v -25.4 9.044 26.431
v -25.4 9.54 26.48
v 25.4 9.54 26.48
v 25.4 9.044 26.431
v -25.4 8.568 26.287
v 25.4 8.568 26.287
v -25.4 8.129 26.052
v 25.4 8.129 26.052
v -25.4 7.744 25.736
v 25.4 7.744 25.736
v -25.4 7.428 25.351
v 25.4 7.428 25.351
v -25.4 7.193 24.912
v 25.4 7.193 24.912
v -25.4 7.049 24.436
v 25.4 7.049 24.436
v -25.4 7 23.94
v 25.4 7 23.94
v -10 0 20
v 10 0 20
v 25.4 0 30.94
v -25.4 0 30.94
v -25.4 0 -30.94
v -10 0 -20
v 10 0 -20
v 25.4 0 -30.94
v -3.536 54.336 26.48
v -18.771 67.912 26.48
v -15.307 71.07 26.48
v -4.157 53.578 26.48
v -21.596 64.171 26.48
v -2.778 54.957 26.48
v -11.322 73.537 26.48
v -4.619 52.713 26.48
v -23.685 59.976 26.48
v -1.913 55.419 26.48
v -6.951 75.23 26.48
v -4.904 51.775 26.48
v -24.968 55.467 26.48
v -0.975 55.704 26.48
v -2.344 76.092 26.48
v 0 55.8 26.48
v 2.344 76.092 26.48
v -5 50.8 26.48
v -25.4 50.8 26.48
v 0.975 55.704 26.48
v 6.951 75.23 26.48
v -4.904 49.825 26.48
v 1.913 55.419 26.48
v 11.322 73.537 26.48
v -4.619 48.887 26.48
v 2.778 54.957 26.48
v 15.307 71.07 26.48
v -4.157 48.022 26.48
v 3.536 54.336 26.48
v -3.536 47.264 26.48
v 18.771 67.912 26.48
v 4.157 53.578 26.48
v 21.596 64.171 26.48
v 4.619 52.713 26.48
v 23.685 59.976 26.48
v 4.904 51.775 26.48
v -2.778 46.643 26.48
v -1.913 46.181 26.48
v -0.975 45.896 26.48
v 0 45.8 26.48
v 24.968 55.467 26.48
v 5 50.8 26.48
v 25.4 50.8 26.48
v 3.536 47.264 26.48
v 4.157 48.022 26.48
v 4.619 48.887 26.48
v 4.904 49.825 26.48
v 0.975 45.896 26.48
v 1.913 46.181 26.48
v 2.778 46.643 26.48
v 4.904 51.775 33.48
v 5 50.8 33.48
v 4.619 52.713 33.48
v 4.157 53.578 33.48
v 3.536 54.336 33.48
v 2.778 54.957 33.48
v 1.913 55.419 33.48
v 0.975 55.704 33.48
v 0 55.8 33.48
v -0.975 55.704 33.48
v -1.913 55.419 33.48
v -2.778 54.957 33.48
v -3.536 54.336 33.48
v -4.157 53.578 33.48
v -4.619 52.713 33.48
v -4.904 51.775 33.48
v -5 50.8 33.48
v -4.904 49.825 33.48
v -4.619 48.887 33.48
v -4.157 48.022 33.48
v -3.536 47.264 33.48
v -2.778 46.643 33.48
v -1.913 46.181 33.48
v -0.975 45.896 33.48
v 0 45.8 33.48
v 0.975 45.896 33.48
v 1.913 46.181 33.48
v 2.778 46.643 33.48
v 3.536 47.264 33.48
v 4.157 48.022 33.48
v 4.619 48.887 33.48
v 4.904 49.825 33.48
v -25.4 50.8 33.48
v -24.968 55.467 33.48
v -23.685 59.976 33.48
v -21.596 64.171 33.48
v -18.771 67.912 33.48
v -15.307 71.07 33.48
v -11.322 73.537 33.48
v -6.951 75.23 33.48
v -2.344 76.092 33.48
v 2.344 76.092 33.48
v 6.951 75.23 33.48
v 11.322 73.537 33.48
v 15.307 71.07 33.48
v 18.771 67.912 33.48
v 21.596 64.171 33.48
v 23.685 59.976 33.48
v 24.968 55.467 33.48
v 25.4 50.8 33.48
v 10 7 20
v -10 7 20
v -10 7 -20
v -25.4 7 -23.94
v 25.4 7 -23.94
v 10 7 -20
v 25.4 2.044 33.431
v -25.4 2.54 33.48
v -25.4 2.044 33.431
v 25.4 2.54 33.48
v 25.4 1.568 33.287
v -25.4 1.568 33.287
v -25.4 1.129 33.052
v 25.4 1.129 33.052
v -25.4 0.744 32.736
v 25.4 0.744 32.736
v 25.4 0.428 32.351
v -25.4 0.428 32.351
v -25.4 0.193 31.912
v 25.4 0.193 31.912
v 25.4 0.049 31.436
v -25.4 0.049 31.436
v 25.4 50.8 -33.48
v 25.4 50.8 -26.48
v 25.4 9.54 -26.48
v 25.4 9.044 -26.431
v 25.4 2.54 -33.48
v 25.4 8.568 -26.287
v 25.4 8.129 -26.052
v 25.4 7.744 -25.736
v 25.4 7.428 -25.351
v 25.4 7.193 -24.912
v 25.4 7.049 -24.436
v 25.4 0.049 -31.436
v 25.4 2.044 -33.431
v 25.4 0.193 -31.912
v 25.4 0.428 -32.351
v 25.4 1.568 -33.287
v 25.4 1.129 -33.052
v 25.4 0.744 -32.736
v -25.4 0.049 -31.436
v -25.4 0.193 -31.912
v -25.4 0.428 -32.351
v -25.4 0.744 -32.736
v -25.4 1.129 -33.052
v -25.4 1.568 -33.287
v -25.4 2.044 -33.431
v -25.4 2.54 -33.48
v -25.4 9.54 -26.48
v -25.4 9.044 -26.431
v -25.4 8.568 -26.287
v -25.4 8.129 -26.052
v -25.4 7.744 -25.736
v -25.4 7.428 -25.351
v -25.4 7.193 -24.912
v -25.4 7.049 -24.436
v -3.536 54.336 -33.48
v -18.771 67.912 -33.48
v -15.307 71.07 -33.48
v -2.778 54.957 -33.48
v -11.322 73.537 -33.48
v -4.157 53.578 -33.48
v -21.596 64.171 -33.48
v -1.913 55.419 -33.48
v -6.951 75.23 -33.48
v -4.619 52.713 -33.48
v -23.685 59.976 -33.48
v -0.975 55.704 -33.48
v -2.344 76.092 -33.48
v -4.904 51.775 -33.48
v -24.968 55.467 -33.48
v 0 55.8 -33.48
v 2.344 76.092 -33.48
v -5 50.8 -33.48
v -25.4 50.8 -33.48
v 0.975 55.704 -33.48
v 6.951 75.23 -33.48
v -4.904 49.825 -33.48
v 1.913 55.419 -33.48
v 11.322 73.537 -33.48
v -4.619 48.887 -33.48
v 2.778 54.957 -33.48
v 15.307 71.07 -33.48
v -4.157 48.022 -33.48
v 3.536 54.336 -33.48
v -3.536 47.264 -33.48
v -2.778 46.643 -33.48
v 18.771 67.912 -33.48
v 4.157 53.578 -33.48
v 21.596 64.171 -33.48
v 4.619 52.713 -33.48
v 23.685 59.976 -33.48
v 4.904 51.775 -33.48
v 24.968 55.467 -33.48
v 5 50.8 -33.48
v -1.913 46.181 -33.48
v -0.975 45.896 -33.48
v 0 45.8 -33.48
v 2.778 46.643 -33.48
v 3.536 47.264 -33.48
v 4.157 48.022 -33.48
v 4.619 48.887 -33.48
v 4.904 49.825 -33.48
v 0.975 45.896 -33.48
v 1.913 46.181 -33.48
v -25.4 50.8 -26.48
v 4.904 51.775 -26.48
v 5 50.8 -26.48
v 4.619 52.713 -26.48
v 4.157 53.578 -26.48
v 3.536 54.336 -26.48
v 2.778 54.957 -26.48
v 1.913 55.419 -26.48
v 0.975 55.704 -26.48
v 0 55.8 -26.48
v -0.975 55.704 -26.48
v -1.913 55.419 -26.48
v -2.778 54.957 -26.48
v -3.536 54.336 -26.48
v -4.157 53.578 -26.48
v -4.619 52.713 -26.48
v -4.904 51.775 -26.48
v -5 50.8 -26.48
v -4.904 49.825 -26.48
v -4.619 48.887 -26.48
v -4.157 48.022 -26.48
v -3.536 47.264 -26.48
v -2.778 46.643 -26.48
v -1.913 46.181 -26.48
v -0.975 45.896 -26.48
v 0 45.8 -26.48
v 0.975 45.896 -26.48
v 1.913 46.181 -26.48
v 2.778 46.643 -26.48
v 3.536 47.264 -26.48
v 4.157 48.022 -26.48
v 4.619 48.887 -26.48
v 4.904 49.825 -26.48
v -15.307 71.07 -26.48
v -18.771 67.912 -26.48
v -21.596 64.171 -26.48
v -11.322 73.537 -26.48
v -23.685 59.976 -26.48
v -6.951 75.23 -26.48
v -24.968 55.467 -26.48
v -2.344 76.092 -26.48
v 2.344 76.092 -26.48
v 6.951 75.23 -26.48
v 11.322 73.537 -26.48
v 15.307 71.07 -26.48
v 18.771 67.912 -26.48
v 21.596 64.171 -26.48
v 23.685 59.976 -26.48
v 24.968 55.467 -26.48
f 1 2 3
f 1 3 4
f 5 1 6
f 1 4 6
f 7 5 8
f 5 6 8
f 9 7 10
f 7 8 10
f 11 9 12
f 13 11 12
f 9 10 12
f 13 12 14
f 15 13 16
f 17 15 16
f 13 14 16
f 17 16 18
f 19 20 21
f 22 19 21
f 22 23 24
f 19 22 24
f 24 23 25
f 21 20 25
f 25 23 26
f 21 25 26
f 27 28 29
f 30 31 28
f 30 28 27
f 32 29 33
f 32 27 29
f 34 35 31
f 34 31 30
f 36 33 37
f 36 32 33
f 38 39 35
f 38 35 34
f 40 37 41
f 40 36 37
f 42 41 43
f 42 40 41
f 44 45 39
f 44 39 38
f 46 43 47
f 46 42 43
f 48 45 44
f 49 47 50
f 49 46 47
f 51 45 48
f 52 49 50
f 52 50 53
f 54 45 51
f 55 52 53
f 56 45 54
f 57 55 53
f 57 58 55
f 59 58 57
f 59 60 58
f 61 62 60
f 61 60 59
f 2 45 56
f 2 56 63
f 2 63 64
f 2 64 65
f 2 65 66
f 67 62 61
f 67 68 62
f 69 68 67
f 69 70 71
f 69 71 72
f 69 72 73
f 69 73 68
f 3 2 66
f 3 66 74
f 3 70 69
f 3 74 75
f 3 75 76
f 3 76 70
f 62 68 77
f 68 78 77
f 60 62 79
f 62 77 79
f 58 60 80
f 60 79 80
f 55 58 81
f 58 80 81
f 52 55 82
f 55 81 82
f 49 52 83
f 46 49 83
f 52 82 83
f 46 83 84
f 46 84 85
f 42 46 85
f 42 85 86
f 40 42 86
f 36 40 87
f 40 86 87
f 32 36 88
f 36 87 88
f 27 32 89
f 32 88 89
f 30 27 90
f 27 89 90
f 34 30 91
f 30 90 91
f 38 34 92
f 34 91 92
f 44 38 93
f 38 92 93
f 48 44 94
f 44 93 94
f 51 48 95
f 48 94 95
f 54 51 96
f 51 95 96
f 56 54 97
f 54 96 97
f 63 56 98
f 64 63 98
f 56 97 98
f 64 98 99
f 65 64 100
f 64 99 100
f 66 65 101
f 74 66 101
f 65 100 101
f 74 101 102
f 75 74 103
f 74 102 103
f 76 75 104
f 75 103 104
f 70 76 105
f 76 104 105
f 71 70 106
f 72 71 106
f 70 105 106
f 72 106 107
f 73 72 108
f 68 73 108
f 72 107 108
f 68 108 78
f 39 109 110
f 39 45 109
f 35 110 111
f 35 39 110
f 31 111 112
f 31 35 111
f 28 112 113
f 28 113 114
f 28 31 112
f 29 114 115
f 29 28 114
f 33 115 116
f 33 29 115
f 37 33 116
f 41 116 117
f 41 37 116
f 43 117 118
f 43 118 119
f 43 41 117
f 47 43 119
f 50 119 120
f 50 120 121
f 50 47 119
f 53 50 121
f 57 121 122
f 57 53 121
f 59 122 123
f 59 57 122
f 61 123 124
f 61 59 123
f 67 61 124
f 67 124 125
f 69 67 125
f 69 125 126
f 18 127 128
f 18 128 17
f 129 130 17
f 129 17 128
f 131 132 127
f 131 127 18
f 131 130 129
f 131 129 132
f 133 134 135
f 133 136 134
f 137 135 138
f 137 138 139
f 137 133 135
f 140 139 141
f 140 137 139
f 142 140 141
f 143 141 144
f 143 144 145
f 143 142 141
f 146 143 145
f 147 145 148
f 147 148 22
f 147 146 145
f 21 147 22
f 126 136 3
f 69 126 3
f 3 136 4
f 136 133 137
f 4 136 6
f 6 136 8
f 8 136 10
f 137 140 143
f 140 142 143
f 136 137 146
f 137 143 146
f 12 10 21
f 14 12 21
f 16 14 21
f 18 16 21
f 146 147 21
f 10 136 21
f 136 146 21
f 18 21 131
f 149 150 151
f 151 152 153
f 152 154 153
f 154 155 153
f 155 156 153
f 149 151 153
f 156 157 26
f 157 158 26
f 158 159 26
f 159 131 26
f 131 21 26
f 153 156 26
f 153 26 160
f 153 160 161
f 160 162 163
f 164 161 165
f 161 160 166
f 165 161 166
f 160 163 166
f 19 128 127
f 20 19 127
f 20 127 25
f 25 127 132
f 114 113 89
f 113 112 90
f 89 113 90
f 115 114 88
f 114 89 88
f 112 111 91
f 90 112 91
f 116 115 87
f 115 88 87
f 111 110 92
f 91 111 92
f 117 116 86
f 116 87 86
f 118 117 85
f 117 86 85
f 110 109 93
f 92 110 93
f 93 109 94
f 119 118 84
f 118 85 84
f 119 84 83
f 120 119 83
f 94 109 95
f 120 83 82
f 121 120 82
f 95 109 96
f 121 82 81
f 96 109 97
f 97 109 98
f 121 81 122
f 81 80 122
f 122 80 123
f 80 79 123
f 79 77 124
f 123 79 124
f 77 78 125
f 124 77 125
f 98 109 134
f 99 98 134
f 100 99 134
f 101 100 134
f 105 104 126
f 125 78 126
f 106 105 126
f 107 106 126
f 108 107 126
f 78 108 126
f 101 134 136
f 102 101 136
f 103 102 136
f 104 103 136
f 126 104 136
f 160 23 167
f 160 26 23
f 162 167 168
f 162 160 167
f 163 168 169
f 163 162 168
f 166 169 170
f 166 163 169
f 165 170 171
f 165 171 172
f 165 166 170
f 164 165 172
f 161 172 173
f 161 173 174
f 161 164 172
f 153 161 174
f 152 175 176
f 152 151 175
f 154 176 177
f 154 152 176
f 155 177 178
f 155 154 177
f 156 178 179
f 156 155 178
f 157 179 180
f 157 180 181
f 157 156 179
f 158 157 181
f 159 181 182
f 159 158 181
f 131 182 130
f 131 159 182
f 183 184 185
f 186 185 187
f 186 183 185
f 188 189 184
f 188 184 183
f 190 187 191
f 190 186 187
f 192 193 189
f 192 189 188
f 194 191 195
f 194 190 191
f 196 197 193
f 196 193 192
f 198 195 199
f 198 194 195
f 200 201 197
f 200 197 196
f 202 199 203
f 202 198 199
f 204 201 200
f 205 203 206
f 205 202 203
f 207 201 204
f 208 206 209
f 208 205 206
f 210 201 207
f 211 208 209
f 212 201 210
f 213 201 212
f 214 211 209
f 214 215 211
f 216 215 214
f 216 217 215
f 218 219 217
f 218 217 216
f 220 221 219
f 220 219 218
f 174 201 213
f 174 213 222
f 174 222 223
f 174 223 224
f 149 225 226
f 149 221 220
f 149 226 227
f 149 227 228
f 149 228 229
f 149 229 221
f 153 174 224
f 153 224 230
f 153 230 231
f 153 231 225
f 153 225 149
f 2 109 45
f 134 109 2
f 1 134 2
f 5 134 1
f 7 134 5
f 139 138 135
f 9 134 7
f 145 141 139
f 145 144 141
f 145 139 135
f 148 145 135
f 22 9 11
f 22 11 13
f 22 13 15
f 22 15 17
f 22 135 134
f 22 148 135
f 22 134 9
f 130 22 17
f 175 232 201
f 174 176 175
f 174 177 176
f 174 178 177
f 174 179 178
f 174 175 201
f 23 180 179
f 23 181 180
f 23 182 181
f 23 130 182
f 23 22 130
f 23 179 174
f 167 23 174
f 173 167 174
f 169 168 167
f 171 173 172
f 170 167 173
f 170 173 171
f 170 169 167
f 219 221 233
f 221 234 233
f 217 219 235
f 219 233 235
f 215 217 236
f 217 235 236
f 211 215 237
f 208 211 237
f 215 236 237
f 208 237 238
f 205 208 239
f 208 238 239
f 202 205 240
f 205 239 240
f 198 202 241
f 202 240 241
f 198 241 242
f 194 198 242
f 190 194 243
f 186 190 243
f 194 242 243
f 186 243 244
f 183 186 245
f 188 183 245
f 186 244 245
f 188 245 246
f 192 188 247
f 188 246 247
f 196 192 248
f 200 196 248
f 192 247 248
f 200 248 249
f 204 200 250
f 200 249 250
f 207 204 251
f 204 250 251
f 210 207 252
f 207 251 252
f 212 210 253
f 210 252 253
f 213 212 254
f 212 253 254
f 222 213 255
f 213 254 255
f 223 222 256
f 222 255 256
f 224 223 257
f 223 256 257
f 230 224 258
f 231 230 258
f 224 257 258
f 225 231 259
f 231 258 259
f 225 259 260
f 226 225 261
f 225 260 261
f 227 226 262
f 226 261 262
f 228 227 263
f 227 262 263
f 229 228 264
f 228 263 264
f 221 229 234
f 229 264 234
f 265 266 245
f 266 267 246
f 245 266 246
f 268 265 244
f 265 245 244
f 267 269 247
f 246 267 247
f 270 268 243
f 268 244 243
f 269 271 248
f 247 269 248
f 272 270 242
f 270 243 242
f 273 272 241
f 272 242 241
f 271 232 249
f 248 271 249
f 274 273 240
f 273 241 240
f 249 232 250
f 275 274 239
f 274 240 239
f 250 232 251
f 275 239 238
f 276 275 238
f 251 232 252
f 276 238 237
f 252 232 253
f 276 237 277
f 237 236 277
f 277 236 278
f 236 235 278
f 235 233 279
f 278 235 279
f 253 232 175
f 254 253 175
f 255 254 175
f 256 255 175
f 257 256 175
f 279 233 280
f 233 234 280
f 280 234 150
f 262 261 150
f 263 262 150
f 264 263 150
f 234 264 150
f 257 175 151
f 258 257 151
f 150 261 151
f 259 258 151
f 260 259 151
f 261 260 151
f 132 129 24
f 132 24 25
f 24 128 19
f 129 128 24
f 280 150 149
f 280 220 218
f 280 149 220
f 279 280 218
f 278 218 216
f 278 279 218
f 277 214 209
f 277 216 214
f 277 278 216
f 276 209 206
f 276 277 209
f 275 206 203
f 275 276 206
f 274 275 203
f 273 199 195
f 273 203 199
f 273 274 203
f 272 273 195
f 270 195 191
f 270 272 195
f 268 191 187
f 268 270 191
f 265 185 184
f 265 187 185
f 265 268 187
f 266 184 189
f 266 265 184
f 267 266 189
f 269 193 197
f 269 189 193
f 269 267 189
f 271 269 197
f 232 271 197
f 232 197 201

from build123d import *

# Parameters (mm, degrees)
SKETCH1_W           = 50.8
SKETCH1_H           = 66.96
BOSS_EXTRUDE1_DEPTH = 7
SKETCH2_W           = 20
SKETCH2_H           = 40
CUT_EXTRUDE1_DEPTH  = 7
SKETCH3_W           = 50.8
SKETCH3_H           = 7
BOSS_EXTRUDE2_DEPTH = 69.2
FILLET2_RADIUS      = 25.4
FILLET2_LENGTH      = 7
FILLET3_RADIUS      = 25.4
FILLET3_LENGTH      = 7
SKETCH4_R           = 5
CUT_EXTRUDE2_DEPTH  = 400
FILLET5_R           = 2.54


with BuildPart() as part:
    # Sketch1 → Boss-Extrude1 (new body)
    with BuildSketch(Plane(origin=(0, 0, 0), x_dir=(1, 0, 0), z_dir=(0, 1, 0))):
        Rectangle(SKETCH1_W, SKETCH1_H)
    extrude(amount=BOSS_EXTRUDE1_DEPTH)

    # Sketch2 → Cut-Extrude1 (cut)
    with BuildSketch(Plane(origin=(0, 7, 0), x_dir=(1, 0, 0), z_dir=(0, 1, 0))):
        Rectangle(SKETCH2_W, SKETCH2_H)
    extrude(amount=-CUT_EXTRUDE1_DEPTH, mode=Mode.SUBTRACT)

    # Sketch3 → Boss-Extrude2 (add)
    with BuildSketch(Plane(origin=(0, 7, 0), x_dir=(1, 0, 0), z_dir=(0, 1, 0))):
        with Locations((0, 29.98)):
            Rectangle(SKETCH3_W, SKETCH3_H)
        with Locations((0, -29.98)):
            Rectangle(SKETCH3_W, SKETCH3_H)
    extrude(amount=BOSS_EXTRUDE2_DEPTH)

    # Fillet2: full round fillet: the end face becomes a half cylinder, R = half its width
    fillet2_face = Plane((0, 76.2, -29.98), x_dir=(0, 0, 1), z_dir=(0, 1, 0))  # on the end face: x along it, z out of the body
    fillet2_slab = fillet2_face.offset(-FILLET2_RADIUS / 2) * Box(FILLET2_LENGTH, 2 * FILLET2_RADIUS, FILLET2_RADIUS, mode=Mode.PRIVATE)  # the body's end, R deep
    fillet2_round = Plane((0, 50.8, -29.98), x_dir=(0, 1, 0), z_dir=(0, 0, 1)) * Cylinder(FILLET2_RADIUS, FILLET2_LENGTH, mode=Mode.PRIVATE)  # its axis R under the face
    add(fillet2_slab - fillet2_round, mode=Mode.SUBTRACT)

    # Fillet3: full round fillet: the end face becomes a half cylinder, R = half its width
    fillet3_face = Plane((0, 76.2, 29.98), x_dir=(0, 0, -1), z_dir=(0, 1, 0))  # on the end face: x along it, z out of the body
    fillet3_slab = fillet3_face.offset(-FILLET3_RADIUS / 2) * Box(FILLET3_LENGTH, 2 * FILLET3_RADIUS, FILLET3_RADIUS, mode=Mode.PRIVATE)  # the body's end, R deep
    fillet3_round = Plane((0, 50.8, 29.98), x_dir=(0, 1, 0), z_dir=(0, 0, -1)) * Cylinder(FILLET3_RADIUS, FILLET3_LENGTH, mode=Mode.PRIVATE)  # its axis R under the face
    add(fillet3_slab - fillet3_round, mode=Mode.SUBTRACT)

    # Sketch4 → Cut-Extrude2 (cut, symmetric)
    with BuildSketch(Plane.XY.offset(-26.48)):
        with Locations((0, 50.8)):
            Circle(SKETCH4_R)
    extrude(amount=CUT_EXTRUDE2_DEPTH, both=True, mode=Mode.SUBTRACT)

    # Fillet5
    fillet5_edges = [part.edges().sort_by_distance(p)[0] for p in [
        (0, 7, -26.48),
        (0, 7, 26.48),
        (0, 0, -33.48),
        (0, 0, 33.48),
    ]]
    fillet(fillet5_edges, radius=FILLET5_R)


solid = part.part
